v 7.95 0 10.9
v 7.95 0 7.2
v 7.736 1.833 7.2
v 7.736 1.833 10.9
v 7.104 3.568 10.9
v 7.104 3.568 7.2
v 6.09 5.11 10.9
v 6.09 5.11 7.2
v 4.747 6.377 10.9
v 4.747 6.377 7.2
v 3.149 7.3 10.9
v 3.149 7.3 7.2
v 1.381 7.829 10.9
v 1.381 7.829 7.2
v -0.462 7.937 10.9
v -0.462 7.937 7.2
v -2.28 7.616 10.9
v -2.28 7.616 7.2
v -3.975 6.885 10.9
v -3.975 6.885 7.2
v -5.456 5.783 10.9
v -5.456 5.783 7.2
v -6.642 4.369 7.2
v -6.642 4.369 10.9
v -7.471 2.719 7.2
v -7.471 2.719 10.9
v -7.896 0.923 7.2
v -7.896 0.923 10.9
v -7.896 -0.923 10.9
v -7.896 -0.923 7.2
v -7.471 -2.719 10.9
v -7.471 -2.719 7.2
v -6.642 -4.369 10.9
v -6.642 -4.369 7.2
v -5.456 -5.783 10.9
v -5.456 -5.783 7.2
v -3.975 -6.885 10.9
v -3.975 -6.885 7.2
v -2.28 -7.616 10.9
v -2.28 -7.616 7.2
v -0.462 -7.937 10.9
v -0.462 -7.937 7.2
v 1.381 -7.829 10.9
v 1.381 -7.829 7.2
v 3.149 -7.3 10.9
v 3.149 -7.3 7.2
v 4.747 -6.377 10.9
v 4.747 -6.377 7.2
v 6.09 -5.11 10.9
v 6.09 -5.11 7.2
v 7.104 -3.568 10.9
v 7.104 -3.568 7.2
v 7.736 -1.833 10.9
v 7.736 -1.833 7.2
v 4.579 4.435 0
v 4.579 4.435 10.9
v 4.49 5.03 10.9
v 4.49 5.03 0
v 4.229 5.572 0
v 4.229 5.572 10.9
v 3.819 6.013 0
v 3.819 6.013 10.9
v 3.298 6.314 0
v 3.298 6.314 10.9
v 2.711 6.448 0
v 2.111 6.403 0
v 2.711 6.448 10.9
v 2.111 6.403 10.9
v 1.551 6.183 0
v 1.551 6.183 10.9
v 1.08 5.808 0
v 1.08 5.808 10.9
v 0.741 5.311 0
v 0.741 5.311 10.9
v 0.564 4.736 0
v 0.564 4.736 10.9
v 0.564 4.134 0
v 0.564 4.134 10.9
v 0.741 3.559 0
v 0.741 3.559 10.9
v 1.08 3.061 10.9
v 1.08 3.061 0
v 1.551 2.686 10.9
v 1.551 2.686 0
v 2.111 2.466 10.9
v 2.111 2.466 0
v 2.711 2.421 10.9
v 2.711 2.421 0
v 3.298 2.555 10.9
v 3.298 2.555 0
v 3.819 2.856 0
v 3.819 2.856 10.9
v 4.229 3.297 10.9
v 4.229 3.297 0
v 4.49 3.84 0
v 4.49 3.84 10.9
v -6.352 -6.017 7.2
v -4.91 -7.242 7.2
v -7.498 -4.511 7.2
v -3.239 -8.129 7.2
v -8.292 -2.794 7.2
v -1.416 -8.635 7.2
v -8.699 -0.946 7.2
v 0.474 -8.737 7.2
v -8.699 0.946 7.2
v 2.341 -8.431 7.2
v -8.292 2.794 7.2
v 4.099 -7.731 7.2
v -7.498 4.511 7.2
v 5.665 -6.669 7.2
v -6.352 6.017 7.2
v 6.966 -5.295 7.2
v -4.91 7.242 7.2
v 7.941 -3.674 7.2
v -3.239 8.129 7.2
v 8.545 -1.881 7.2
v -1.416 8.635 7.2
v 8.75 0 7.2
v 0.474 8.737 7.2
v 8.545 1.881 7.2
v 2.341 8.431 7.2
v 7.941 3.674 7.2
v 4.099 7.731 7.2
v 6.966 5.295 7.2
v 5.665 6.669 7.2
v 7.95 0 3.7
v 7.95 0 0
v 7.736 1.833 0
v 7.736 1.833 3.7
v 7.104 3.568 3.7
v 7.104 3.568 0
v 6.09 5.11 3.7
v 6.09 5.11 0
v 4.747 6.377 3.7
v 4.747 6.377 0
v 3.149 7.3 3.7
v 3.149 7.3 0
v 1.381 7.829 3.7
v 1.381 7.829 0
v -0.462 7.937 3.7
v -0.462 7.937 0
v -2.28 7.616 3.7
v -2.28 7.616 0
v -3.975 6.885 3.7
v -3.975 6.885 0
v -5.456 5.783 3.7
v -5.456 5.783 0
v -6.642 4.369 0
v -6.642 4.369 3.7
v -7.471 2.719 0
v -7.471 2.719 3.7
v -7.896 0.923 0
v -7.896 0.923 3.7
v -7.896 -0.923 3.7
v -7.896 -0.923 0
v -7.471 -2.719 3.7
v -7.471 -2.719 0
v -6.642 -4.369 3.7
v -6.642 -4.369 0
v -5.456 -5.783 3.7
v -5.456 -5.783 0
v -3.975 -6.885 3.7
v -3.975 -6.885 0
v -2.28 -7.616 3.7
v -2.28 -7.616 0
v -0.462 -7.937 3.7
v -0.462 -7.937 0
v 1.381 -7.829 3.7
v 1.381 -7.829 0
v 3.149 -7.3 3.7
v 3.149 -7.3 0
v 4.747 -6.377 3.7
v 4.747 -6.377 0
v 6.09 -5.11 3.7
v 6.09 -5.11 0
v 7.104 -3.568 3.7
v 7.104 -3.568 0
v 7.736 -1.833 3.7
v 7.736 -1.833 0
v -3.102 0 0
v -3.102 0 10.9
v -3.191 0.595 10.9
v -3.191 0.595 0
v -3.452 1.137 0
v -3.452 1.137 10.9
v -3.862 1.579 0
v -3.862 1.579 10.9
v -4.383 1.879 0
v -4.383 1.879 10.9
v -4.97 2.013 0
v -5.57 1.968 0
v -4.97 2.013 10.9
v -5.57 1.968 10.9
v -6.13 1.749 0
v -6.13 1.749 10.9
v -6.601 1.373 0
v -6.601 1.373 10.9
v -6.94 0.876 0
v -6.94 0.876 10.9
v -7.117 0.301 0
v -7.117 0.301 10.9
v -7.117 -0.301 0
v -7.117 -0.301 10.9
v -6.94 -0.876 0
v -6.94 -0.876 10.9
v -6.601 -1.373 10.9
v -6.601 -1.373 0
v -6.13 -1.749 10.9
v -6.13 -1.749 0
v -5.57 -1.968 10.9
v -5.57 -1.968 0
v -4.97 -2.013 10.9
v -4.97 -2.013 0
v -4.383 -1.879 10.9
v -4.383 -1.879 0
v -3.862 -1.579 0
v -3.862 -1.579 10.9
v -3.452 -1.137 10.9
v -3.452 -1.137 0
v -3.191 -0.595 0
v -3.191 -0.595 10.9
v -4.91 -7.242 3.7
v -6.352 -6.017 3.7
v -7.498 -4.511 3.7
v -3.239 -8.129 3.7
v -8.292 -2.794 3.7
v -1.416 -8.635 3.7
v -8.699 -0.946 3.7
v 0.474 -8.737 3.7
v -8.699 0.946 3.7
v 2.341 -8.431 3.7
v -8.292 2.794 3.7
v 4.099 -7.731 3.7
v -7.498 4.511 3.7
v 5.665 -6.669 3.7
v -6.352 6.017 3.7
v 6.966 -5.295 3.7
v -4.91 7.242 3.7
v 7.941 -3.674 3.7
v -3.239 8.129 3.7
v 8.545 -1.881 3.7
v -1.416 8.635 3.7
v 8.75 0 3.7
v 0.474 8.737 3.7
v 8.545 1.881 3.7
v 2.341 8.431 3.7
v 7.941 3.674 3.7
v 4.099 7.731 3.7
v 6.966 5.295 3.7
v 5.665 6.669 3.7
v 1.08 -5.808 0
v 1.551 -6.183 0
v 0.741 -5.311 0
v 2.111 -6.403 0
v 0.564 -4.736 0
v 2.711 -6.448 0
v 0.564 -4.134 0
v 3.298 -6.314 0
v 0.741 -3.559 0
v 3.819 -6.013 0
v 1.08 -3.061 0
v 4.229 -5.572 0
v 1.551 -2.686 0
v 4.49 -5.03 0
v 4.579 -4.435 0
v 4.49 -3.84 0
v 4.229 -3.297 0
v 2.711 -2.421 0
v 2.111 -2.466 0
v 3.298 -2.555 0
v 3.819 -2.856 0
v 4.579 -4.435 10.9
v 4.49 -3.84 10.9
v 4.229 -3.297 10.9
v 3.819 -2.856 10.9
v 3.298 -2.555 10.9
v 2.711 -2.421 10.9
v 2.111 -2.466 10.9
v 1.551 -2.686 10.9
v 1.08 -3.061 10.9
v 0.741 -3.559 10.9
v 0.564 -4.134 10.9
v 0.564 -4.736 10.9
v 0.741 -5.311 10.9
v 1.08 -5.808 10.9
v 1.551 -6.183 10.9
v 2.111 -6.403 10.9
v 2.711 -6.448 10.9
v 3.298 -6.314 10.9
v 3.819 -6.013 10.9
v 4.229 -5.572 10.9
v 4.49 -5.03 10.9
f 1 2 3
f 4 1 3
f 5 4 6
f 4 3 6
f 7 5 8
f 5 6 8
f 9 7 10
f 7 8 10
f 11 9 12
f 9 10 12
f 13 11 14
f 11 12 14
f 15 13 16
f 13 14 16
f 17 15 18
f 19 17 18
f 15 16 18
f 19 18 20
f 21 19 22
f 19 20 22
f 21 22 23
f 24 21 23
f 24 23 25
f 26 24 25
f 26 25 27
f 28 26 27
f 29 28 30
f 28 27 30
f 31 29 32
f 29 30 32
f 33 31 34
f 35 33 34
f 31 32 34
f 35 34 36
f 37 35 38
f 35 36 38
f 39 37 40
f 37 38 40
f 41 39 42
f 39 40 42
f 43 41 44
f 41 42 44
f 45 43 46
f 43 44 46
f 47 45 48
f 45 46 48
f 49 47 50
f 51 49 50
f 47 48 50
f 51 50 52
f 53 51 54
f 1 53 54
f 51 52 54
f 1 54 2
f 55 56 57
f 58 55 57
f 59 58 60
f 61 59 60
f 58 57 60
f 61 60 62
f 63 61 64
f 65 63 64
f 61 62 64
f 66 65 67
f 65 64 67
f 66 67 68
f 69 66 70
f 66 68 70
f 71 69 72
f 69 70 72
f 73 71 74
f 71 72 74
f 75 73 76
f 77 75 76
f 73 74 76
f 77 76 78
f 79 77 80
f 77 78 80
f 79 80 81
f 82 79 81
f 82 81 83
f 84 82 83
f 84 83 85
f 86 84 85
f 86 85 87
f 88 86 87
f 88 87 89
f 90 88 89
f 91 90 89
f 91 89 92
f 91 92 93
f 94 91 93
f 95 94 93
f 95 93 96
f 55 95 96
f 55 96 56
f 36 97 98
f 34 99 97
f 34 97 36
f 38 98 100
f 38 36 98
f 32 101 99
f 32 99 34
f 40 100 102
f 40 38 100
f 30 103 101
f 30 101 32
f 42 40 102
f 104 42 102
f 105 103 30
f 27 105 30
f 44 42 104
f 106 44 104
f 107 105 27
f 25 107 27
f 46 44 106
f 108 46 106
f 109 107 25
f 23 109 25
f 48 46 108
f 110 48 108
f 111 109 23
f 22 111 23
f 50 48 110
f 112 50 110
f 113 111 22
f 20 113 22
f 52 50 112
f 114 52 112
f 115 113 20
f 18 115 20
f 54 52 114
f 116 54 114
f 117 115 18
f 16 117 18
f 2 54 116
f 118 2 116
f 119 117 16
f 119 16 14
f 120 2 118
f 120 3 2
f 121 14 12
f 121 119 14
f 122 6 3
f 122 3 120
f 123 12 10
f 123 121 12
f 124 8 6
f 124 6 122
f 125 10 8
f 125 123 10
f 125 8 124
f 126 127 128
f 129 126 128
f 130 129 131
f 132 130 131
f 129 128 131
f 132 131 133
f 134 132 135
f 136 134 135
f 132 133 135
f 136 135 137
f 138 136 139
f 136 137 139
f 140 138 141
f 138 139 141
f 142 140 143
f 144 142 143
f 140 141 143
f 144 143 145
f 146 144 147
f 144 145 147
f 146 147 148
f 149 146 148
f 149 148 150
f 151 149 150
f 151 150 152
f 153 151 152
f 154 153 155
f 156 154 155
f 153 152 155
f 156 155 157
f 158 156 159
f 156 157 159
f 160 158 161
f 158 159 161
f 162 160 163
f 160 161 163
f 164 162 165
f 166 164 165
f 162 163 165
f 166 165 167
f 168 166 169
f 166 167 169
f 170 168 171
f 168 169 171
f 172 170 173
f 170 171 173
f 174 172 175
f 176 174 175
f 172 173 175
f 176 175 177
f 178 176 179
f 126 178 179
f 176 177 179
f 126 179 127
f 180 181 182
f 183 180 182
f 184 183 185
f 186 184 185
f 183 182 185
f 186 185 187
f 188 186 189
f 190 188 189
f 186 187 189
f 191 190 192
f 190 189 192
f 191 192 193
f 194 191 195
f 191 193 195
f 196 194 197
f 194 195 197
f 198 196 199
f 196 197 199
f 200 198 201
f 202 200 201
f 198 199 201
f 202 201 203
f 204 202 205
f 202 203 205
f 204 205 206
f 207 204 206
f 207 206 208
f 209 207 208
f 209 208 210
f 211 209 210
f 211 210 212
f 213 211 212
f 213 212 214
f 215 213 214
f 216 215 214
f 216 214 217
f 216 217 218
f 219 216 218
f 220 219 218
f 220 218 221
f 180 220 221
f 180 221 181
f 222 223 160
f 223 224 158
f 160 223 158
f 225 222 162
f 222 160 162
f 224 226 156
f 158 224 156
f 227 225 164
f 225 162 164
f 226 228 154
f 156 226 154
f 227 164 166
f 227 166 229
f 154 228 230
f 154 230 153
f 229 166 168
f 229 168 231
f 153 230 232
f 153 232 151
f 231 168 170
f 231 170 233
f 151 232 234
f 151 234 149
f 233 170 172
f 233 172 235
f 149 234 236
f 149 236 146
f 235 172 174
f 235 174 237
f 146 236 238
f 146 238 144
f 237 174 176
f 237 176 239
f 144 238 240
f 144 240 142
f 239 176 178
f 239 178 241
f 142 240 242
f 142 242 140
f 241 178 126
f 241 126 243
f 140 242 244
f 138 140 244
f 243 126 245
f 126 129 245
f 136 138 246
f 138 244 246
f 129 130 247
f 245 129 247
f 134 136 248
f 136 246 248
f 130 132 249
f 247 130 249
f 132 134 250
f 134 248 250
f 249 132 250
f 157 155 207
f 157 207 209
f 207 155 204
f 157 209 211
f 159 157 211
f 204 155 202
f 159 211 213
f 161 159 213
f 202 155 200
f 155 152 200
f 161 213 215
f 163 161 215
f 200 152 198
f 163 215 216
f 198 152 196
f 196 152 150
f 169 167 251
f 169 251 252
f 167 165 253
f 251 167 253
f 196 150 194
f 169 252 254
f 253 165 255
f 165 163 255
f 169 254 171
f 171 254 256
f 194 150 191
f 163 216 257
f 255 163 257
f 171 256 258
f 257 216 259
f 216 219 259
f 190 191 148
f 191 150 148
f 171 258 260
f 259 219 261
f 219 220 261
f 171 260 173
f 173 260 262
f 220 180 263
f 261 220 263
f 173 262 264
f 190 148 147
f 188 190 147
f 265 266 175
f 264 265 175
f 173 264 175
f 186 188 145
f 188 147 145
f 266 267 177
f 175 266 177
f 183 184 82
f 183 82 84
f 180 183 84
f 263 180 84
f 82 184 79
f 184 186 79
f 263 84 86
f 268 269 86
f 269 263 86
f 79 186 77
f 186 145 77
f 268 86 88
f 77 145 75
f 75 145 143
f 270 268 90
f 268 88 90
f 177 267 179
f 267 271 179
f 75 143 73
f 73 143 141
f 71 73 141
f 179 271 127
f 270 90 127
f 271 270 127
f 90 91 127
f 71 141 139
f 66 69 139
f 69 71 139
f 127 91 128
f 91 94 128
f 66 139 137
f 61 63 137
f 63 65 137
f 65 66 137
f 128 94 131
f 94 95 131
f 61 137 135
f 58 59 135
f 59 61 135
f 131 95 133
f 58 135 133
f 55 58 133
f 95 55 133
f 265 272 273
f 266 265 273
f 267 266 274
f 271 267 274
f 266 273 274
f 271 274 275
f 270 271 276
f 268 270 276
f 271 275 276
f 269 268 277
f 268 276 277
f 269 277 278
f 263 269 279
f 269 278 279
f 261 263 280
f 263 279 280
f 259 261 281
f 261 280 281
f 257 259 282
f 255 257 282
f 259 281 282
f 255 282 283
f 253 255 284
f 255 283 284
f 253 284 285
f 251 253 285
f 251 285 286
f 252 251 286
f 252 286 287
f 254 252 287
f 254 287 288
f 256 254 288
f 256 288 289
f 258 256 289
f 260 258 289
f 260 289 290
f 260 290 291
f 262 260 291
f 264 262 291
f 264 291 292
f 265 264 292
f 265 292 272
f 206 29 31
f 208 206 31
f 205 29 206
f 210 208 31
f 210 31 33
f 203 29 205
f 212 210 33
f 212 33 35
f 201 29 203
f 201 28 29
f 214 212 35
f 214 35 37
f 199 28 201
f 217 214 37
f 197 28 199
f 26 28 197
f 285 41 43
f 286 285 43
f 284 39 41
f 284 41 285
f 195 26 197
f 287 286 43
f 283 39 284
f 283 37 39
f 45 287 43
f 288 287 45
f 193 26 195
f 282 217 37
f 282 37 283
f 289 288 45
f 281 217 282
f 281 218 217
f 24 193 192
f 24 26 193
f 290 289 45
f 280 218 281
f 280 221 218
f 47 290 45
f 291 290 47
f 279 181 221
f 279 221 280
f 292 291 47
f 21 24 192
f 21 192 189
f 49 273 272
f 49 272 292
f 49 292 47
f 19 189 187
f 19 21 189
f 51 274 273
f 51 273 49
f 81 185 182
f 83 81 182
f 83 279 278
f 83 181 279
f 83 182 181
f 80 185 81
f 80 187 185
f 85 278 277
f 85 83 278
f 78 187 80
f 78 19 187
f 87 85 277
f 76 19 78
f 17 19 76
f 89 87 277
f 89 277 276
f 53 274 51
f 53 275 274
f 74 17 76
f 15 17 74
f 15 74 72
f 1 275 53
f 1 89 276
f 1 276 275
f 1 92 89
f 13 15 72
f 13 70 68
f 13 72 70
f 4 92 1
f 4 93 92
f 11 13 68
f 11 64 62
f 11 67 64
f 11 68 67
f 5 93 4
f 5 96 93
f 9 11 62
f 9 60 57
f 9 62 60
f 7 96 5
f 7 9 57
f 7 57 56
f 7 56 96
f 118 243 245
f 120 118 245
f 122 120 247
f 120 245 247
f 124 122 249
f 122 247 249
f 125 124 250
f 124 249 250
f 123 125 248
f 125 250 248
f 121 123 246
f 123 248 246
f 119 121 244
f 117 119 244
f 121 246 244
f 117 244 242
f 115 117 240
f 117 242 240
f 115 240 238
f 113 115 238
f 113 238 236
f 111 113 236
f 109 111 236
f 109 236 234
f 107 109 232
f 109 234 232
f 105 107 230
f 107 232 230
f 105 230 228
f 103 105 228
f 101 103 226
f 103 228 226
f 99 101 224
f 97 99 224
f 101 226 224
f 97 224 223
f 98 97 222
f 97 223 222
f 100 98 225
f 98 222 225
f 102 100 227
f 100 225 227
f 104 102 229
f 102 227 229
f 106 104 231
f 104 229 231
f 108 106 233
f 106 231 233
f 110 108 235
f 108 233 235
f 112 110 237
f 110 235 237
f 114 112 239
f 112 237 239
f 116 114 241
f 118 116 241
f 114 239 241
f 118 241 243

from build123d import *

# Parameters (mm, degrees)
F0_R     = 7.95
F1_DEPTH = 3.7
F2_R     = 8.75
F3_DEPTH = 3.5
F4_R     = 7.95
F5_DEPTH = 3.7
F6_R     = 2.0190036786
F7_DEPTH = 10.901


with BuildPart() as f1:
    # F0 (on Top) → F1 (new body)
    with BuildSketch(Plane.XY):
        Circle(F0_R)
    extrude(amount=F1_DEPTH)

    # F2 (on face) → F3 (join)
    with BuildSketch(Plane.XY.offset(3.7)):
        Circle(F2_R)
    extrude(amount=F3_DEPTH)

    # F4 (on face) → F5 (join)
    with BuildSketch(Plane.XY.offset(7.2)):
        Circle(F4_R)
    extrude(amount=F5_DEPTH)

    # F6 (on face) → F7 (cut, through all)
    with BuildSketch(Plane.XY.offset(10.9)):
        with Locations((-5.1206611768, 0)):
            Circle(F6_R)
        with Locations((2.5603305884, -4.4346226633)):
            Circle(F6_R)
        with Locations((2.5603305884, 4.4346226633)):
            Circle(F6_R)
    extrude(amount=-F7_DEPTH, mode=Mode.SUBTRACT)


solid = f1.part
